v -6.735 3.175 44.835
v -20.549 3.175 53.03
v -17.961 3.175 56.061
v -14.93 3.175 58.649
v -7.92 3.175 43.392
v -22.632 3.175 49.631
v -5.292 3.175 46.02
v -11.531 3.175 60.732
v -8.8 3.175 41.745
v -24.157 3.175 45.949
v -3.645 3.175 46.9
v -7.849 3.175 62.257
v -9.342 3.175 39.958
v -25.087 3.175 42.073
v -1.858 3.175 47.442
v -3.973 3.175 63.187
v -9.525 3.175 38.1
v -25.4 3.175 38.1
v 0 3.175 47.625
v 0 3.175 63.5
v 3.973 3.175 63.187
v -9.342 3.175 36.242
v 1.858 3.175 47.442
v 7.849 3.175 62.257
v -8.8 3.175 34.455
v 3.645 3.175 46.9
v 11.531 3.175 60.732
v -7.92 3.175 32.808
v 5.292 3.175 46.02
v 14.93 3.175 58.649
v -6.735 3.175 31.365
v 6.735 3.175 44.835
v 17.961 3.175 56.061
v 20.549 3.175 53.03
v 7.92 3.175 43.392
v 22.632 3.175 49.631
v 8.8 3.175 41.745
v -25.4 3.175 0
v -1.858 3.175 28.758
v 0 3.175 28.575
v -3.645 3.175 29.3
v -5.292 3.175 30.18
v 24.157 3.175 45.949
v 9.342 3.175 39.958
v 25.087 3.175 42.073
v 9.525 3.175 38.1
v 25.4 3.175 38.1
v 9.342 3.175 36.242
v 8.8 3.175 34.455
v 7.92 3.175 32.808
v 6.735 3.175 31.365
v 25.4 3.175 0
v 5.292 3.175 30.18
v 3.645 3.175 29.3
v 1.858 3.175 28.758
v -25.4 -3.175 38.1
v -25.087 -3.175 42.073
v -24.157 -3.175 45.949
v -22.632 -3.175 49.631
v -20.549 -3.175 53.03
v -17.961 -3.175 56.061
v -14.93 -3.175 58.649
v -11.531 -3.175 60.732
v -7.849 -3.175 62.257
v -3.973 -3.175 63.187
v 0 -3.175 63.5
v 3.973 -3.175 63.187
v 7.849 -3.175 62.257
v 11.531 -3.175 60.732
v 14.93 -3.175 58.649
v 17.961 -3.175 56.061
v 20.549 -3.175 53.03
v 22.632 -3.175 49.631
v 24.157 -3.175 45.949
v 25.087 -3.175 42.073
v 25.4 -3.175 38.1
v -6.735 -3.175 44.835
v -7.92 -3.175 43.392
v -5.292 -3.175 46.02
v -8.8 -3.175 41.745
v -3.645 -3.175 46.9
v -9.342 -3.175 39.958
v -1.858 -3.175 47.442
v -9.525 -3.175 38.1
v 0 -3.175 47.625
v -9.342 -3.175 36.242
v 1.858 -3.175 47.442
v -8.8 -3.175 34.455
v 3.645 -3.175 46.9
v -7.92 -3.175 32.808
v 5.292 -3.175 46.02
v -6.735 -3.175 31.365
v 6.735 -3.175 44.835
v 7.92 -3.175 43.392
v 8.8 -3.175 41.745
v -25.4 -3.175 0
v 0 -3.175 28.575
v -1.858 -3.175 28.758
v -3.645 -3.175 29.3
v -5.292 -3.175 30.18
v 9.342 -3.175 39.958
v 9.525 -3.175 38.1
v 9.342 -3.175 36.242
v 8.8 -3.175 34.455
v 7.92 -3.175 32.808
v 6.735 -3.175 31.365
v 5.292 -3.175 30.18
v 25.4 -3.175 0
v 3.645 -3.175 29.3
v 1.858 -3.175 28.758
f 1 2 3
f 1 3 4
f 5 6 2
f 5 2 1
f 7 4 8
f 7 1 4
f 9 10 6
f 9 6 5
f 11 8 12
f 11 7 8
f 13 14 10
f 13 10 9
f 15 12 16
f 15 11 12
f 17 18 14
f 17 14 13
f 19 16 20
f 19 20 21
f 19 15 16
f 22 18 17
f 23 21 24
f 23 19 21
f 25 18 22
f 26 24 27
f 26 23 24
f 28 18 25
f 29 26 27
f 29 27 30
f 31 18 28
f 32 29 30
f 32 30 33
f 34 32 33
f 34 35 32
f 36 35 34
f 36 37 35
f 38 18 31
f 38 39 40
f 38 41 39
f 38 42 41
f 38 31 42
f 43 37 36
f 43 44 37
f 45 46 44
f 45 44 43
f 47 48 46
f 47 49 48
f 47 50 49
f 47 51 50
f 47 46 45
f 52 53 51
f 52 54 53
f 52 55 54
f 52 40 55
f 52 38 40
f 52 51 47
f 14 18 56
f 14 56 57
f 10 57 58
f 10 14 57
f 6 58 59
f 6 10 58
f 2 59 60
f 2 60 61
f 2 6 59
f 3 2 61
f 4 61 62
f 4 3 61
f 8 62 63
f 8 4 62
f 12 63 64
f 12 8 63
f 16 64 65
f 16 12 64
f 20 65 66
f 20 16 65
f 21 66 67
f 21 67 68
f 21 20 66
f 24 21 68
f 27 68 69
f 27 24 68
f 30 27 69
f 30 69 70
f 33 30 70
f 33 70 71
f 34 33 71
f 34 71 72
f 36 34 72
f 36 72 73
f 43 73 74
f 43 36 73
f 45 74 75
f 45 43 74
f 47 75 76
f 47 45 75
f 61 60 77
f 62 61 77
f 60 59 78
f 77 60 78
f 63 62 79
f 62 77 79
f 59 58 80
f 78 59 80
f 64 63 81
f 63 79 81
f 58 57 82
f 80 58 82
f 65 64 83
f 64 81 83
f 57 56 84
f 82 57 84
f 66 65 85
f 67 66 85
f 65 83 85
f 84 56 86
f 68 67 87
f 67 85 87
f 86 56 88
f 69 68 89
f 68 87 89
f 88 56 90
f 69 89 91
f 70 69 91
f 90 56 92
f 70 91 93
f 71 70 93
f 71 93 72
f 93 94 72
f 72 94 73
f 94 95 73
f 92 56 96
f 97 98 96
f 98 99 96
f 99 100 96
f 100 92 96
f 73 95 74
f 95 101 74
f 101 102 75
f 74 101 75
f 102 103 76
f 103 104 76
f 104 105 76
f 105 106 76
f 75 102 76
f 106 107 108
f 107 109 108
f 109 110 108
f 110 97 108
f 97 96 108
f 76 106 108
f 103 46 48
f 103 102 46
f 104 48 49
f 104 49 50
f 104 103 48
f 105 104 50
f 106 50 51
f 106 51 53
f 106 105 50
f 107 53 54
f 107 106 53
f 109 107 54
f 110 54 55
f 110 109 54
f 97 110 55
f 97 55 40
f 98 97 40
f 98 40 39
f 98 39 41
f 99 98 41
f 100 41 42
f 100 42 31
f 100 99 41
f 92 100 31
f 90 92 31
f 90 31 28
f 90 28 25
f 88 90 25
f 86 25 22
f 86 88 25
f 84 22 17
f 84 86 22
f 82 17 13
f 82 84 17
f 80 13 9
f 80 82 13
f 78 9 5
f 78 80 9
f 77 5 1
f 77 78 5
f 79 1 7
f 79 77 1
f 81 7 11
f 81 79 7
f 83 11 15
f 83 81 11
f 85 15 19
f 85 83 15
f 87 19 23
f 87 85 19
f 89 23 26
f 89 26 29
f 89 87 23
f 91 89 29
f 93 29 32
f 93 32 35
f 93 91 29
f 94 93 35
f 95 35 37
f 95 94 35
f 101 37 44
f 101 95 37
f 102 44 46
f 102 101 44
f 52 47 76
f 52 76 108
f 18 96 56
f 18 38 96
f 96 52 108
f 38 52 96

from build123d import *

# Parameters (mm, degrees)
SKETCH1_R           = 9.525
BOSS_EXTRUDE1_DEPTH = 3.175


with BuildPart() as part:
    # Sketch1 → Boss-Extrude1 (new body, symmetric)
    with BuildSketch(Plane(origin=(0, 0, 0), x_dir=(1, 0, 0), z_dir=(0, 1, 0))):
        with BuildLine():
            Line((-25.4, 0), (-25.4, -38.1))
            ThreePointArc((-25.4, -38.1), (0, -63.5), (25.4, -38.1))
            Line((25.4, -38.1), (25.4, 0))
            Line((25.4, 0), (-25.4, 0))
        make_face()
        with Locations((0, -38.1)):
            Circle(SKETCH1_R, mode=Mode.SUBTRACT)
    extrude(amount=BOSS_EXTRUDE1_DEPTH, both=True)


solid = part.part
